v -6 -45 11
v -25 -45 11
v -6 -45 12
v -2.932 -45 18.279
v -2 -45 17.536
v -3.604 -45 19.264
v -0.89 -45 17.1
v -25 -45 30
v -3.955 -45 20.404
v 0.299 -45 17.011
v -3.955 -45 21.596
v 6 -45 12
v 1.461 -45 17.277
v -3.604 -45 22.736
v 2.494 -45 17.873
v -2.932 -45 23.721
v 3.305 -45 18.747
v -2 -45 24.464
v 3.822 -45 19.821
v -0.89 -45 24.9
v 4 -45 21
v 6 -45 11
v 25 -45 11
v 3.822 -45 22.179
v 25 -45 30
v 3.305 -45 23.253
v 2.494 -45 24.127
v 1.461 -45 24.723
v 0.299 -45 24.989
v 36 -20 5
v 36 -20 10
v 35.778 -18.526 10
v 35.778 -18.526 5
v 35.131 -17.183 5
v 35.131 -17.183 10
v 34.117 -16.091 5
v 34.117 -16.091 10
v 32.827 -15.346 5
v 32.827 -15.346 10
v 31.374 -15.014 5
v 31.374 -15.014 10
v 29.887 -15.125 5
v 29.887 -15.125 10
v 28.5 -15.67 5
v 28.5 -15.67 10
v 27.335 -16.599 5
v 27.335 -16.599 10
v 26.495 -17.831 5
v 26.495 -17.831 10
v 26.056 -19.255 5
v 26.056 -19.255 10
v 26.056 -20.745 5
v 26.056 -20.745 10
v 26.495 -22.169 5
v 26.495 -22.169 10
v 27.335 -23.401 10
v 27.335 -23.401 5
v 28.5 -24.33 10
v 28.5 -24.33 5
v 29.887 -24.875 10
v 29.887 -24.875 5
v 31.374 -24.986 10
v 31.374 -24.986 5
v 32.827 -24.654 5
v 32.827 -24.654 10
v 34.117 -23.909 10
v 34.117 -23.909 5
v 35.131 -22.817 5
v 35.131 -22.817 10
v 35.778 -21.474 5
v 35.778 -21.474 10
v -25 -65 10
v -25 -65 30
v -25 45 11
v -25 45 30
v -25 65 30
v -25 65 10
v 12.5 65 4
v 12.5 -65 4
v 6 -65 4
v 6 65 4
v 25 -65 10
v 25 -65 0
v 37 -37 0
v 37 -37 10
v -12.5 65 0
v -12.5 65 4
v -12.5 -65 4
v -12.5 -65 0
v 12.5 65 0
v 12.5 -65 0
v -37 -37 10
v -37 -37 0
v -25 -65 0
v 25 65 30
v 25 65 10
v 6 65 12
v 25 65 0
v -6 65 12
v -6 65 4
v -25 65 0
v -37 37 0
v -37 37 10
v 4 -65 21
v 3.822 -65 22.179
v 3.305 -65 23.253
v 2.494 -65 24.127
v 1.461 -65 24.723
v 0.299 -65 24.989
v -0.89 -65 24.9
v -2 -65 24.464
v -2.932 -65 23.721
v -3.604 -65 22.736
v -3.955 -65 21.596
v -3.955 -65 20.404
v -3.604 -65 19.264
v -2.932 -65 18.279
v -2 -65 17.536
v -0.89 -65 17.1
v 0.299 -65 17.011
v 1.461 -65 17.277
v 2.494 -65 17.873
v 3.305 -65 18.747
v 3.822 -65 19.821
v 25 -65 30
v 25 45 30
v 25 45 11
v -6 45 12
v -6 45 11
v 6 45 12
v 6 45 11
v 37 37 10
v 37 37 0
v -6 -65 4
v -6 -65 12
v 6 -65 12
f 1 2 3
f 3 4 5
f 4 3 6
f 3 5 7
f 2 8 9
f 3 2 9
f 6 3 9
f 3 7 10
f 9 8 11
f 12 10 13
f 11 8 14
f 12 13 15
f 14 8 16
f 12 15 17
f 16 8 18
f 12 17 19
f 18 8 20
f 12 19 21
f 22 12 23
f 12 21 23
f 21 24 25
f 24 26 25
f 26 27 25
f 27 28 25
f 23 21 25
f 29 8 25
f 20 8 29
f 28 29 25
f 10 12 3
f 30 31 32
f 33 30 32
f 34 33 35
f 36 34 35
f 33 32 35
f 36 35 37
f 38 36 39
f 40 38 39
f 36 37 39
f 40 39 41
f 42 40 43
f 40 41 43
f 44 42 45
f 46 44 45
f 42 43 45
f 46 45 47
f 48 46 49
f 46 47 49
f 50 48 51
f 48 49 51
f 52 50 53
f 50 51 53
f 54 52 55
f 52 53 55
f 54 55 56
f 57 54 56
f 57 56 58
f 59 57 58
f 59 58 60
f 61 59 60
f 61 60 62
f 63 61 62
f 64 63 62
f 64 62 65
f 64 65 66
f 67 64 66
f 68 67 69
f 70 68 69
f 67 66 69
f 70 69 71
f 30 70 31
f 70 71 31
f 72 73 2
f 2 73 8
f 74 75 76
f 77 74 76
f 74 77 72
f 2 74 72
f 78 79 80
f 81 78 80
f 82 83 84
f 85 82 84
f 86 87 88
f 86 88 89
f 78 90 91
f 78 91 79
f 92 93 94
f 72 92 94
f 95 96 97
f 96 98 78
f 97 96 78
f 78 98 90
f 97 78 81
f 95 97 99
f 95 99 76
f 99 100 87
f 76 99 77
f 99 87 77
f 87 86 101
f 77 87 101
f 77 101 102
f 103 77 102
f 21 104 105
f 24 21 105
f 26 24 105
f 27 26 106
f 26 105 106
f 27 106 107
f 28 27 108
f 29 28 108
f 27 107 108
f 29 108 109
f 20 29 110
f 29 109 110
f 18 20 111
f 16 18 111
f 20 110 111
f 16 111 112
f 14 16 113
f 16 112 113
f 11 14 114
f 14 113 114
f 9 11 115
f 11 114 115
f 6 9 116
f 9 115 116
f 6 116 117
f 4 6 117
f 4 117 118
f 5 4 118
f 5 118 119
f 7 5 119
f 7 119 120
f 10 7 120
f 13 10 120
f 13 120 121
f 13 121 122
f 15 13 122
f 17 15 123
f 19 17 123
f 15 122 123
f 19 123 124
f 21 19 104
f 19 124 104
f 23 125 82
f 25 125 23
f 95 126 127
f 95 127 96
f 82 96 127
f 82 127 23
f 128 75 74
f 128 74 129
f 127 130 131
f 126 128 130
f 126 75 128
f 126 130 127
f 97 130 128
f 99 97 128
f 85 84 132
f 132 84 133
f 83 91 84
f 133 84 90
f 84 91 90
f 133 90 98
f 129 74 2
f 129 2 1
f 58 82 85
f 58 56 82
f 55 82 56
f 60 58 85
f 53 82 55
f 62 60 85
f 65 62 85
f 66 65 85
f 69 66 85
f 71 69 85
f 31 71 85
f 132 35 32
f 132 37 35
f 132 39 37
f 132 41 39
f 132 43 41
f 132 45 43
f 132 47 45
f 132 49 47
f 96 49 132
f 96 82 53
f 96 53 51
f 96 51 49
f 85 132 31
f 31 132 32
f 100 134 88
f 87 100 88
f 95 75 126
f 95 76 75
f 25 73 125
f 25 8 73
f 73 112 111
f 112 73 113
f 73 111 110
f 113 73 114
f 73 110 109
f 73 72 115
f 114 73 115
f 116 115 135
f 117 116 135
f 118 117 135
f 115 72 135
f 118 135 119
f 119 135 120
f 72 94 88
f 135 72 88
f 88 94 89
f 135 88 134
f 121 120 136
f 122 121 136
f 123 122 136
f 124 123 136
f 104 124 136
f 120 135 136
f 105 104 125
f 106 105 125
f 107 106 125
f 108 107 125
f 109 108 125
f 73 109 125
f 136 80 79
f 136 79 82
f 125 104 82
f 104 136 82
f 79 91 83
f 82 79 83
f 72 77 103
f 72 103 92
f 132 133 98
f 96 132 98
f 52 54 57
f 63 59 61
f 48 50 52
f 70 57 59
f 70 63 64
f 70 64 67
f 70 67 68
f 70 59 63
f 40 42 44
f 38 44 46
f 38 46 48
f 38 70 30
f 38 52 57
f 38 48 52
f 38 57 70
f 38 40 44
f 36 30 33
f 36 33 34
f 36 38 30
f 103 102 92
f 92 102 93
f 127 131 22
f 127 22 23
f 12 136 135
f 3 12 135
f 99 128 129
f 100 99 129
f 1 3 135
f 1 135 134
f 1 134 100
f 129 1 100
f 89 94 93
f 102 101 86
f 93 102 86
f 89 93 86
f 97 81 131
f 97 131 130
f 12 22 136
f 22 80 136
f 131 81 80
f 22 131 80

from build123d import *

# Parameters (mm, degrees)
F1_DEPTH  = 30
F2_W      = 12
F2_H      = 130
F3_DEPTH  = 20
F4_W      = 50
F4_H      = 90
F5_DEPTH  = 19
F7_DEPTH  = 130.001
F8_R      = 4
F9_DEPTH  = 20
F10_R     = 5
F11_DEPTH = 5


with BuildPart() as f1:
    # F0 (on Top) → F1 (new body)
    with BuildSketch(Plane.XY):
        Polygon((37, 37), (25, 65), (-25, 65), (-37, 37), (-37, -37), (-25, -65), (25, -65), (37, -37), align=None)
    extrude(amount=F1_DEPTH)

    # F2 (on face) → F3 (cut)
    with BuildSketch(Plane.XY.offset(30)):
        with Locations((31, 0)):
            Rectangle(F2_W, F2_H)
        with Locations((-31, 0)):
            Rectangle(F2_W, F2_H)
    extrude(amount=-F3_DEPTH, mode=Mode.SUBTRACT)

    # F4 (on face) → F5 (cut)
    with BuildSketch(Plane.XY.offset(30)):
        Rectangle(F4_W, F4_H)
    extrude(amount=-F5_DEPTH, mode=Mode.SUBTRACT)

    # F6 (on face) → F7 (cut, through all)
    with BuildSketch(Plane.XZ.offset(65)):
        Polygon((-12.5, 4), (-12.5, 0), (12.5, 0), (12.5, 4), (6, 4), (6, 12), (-6, 12), (-6, 4), align=None)
    extrude(amount=-F7_DEPTH, mode=Mode.SUBTRACT)

    # F8 (on face) → F9 (cut, through all)
    with BuildSketch(Plane.XZ.offset(65)):
        with Locations((0, 21)):
            Circle(F8_R)
    extrude(amount=-F9_DEPTH, mode=Mode.SUBTRACT)

    # F10 (on face) → F11 (cut)
    with BuildSketch(Plane.XY.offset(10)):
        with Locations((31, -20)):
            Circle(F10_R)
    extrude(amount=-F11_DEPTH, mode=Mode.SUBTRACT)


solid = f1.part
